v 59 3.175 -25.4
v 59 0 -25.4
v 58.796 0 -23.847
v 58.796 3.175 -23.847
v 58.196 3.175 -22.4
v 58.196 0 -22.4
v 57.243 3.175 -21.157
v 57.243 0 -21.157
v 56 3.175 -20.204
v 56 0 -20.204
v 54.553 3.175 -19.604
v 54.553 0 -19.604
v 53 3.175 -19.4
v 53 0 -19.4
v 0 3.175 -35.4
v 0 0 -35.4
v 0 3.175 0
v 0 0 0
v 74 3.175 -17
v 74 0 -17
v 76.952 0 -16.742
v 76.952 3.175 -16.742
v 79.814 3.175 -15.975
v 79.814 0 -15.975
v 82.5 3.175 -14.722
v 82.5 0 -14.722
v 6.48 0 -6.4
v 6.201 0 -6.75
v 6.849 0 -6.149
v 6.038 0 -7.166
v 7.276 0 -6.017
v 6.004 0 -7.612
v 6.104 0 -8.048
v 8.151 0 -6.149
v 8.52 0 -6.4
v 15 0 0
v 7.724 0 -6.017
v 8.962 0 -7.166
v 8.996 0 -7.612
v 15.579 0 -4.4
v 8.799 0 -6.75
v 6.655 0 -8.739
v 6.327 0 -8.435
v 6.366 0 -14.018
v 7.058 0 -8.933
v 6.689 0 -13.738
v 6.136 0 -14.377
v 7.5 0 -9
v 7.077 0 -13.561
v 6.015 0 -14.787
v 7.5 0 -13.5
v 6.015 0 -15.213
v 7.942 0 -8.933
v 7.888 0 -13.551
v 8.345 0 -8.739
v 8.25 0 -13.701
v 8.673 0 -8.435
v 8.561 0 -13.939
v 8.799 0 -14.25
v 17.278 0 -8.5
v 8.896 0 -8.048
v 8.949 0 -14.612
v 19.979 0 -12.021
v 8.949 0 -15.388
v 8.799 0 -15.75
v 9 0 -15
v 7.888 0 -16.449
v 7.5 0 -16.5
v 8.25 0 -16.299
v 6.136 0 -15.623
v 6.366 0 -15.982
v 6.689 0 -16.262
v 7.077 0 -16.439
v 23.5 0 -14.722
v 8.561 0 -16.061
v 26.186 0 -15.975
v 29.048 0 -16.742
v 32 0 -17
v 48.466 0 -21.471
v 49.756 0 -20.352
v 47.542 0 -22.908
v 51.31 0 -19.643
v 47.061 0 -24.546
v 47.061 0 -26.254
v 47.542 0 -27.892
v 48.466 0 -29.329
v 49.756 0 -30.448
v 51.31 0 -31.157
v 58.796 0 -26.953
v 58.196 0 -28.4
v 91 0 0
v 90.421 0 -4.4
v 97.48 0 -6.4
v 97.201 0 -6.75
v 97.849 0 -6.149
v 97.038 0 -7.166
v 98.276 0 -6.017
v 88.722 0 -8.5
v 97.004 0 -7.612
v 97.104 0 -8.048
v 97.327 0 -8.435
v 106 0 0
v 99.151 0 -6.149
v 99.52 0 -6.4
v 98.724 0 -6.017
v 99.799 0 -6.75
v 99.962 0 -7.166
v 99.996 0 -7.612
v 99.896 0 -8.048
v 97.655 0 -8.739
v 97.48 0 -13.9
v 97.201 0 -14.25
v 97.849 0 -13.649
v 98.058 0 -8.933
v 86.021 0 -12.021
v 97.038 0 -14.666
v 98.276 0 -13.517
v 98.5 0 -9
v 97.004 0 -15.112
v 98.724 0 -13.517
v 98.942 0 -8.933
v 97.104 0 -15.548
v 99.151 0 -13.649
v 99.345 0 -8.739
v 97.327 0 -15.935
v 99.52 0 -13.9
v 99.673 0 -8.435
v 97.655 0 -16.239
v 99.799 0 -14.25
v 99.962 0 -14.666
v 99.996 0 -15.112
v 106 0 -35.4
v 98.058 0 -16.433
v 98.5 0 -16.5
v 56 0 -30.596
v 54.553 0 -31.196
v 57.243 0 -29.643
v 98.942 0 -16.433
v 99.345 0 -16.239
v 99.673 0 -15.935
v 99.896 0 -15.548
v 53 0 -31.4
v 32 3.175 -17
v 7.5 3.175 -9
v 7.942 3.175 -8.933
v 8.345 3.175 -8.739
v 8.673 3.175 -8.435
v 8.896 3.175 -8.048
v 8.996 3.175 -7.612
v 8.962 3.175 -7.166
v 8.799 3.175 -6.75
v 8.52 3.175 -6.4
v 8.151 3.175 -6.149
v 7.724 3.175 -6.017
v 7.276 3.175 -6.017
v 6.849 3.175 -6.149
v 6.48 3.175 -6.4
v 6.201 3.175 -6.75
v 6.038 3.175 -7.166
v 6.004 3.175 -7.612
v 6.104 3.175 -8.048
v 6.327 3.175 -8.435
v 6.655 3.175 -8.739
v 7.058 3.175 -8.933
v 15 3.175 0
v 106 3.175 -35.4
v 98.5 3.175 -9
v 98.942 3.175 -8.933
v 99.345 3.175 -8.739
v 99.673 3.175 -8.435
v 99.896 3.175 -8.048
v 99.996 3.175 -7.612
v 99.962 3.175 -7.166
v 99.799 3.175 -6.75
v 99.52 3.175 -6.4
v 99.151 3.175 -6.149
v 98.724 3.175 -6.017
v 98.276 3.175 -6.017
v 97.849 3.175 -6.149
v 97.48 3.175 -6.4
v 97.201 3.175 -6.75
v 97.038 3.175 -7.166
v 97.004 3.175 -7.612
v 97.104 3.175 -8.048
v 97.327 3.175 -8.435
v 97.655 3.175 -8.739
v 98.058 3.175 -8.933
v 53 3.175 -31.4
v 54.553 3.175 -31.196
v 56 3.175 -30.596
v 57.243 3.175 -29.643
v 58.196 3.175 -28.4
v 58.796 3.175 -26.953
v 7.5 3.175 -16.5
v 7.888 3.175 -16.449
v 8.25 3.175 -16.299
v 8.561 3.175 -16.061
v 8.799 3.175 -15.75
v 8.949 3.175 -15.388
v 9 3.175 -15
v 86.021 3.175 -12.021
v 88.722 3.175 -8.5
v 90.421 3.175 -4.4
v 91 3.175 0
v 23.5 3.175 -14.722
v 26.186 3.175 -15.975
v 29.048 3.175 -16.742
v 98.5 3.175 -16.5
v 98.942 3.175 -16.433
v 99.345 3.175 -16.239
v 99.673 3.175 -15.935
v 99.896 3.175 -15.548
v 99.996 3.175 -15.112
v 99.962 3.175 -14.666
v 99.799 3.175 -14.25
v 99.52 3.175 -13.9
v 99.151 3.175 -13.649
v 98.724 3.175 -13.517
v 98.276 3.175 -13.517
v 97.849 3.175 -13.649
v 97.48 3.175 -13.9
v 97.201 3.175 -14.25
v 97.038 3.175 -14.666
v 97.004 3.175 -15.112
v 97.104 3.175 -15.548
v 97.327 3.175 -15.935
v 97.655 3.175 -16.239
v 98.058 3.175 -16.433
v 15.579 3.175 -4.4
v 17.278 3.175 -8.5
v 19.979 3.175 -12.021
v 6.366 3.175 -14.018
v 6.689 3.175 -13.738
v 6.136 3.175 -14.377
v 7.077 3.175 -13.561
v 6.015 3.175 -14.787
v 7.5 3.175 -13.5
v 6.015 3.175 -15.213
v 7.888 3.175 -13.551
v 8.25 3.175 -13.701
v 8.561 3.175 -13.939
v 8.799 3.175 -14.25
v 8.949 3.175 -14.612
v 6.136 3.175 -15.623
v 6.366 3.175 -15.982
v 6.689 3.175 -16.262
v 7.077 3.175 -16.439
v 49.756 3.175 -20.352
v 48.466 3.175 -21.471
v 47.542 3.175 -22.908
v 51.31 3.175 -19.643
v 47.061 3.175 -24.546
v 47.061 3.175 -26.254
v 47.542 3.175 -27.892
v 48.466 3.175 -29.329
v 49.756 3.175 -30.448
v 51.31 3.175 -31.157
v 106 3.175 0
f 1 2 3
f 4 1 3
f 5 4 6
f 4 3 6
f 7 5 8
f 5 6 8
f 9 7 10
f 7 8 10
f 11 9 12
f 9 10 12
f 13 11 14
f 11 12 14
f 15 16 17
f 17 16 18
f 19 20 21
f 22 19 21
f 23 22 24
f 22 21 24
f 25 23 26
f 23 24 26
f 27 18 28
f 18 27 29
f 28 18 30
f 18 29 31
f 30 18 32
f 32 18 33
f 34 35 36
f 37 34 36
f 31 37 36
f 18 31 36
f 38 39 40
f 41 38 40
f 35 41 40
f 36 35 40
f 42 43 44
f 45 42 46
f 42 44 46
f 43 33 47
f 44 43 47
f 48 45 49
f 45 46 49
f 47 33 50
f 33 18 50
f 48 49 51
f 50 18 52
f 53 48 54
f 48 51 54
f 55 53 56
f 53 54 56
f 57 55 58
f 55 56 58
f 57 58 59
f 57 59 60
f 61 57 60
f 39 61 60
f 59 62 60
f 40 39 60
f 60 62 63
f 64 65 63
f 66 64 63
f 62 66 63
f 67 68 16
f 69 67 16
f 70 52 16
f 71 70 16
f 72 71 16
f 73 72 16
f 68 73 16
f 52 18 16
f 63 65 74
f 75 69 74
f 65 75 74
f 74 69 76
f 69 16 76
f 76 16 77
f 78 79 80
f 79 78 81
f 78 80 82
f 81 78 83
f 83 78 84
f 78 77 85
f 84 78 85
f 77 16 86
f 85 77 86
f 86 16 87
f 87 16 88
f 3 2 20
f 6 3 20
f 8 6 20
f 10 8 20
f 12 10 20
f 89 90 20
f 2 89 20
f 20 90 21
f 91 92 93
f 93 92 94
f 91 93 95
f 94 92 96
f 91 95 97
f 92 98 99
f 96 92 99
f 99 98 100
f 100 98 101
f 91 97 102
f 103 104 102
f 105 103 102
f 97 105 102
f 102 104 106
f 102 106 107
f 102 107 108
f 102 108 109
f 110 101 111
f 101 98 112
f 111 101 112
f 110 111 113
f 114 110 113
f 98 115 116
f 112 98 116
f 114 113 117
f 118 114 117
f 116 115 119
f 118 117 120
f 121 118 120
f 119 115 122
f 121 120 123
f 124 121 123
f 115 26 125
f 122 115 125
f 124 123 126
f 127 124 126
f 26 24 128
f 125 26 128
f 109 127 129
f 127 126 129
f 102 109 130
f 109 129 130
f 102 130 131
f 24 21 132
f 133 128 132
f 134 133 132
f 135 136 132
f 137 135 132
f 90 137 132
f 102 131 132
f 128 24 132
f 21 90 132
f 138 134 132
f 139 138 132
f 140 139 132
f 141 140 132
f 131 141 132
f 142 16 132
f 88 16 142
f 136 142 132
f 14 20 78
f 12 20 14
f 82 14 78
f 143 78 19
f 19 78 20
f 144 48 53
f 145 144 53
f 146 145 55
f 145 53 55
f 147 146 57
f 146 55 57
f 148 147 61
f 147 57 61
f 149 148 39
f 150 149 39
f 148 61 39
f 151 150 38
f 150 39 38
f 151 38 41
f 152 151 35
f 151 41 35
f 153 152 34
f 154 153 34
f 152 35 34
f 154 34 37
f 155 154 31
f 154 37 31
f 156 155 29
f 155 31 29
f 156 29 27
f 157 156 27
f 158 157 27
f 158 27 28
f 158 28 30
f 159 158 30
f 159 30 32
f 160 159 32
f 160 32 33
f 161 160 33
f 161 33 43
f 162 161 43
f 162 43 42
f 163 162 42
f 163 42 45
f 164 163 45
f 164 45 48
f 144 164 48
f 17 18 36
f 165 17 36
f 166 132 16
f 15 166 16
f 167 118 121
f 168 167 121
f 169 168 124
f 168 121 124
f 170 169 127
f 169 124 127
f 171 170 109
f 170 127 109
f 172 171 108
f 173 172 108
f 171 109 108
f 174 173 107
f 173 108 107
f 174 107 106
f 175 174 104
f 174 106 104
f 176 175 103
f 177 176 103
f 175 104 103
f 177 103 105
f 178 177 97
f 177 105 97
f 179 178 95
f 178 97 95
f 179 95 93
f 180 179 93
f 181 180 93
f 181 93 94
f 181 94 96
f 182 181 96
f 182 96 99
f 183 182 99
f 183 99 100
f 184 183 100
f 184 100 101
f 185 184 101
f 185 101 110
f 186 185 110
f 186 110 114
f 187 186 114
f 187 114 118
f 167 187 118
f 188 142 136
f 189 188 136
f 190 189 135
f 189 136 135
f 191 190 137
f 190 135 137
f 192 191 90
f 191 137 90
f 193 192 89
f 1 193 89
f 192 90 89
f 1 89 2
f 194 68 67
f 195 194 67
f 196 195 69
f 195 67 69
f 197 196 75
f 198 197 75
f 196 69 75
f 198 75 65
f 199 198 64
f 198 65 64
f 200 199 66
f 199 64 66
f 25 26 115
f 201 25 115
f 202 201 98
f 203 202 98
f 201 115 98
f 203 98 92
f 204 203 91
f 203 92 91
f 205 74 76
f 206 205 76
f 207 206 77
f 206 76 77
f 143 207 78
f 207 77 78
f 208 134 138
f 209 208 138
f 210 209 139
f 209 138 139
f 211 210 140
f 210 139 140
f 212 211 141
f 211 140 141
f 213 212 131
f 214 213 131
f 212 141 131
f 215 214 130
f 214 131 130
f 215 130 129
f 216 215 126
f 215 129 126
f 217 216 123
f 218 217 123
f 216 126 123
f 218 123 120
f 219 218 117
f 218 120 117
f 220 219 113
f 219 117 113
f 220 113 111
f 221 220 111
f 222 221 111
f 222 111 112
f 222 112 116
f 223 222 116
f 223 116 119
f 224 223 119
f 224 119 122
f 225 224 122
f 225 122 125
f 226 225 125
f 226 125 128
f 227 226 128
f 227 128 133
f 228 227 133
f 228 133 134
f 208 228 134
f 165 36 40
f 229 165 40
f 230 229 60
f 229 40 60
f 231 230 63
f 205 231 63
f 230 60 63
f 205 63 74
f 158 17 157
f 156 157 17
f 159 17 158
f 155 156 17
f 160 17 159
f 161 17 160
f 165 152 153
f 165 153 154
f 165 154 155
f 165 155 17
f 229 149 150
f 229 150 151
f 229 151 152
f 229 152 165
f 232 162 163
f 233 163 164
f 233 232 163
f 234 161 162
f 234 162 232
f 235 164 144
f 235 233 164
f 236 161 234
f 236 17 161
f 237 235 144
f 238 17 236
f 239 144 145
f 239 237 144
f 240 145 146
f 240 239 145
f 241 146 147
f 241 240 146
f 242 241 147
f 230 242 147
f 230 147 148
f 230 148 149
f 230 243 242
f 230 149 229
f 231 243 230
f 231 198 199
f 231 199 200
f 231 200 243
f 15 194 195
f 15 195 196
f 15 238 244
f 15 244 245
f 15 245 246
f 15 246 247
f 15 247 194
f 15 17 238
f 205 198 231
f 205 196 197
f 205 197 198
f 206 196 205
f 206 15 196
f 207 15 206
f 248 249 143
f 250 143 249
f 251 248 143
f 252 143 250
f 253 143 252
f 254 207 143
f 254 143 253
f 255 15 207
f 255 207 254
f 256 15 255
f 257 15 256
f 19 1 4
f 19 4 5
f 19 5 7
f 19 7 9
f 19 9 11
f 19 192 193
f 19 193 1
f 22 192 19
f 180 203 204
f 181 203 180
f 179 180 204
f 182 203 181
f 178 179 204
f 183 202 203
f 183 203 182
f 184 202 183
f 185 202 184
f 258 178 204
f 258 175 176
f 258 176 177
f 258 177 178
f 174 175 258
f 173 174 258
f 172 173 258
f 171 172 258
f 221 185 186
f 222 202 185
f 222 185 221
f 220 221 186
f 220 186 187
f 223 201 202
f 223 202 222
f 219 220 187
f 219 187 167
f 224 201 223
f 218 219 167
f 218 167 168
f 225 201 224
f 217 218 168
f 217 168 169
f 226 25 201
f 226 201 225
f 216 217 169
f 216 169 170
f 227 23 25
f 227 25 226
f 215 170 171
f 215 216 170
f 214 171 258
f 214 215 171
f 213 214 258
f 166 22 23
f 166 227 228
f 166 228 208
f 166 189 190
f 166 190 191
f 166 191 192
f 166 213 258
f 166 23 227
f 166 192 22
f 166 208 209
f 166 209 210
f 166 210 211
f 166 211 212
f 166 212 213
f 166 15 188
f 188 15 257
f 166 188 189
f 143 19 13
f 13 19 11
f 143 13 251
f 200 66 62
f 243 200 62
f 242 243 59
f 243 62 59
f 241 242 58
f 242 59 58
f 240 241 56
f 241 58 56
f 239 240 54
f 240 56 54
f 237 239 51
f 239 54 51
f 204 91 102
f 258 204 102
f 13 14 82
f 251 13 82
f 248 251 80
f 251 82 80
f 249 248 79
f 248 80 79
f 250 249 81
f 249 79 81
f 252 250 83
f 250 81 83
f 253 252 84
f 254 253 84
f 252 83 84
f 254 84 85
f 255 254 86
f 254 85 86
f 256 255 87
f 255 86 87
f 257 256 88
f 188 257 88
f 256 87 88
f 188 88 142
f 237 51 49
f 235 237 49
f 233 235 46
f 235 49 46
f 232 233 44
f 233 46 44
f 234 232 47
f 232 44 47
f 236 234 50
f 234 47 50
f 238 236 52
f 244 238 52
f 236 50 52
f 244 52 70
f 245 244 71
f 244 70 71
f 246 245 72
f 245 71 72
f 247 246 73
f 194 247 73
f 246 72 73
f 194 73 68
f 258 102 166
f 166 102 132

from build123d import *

# Parameters (mm, degrees)
BOSS_EXTRUDE1_DEPTH = 3.175
SKETCH3_R           = 1.5
CUT_EXTRUDE2_DEPTH  = 112.800002795


with BuildPart() as part:
    # Sketch1 → Boss-Extrude1 (new body)
    with BuildSketch(Plane(origin=(0, 0, 0), x_dir=(1, 0, 0), z_dir=(0, 1, 0))):
        with BuildLine():
            ThreePointArc((59, 25.4), (57.242640687, 21.157359313), (53, 19.4))
            Line((53, 19.4), (53, 17.4))
            Line((53, 17.4), (53, 17))
            Line((53, 17), (74, 17))
            Line((74, 17), (91, 17))
            ThreePointArc((91, 17), (99.746427842, 14.577379737), (106, 8))
            Line((106, 8), (106, 35.4))
            Line((106, 35.4), (53, 35.4))
            Line((53, 35.4), (53, 31.4))
            ThreePointArc((53, 31.4), (57.242640687, 29.642640687), (59, 25.4))
        make_face()
        with BuildLine():
            ThreePointArc((106, 8), (99.746427842, 14.577379737), (91, 17))
            Line((91, 17), (91, 0))
            Line((91, 0), (106, 0))
            Line((106, 0), (106, 8))
        make_face()
        with BuildLine():
            Line((91, 0), (91, 17))
            ThreePointArc((91, 17), (86.600076233, 16.420739047), (82.5, 14.722431864))
            ThreePointArc((82.5, 14.722431864), (88.722431864, 8.5), (91, 0))
        make_face()
        with BuildLine():
            Line((91, 17), (74, 17))
            ThreePointArc((74, 17), (78.399923767, 16.420739047), (82.5, 14.722431864))
            ThreePointArc((82.5, 14.722431864), (86.600076233, 16.420739047), (91, 17))
        make_face()
        with BuildLine():
            Line((53, 17.4), (53, 19.4))
            ThreePointArc((53, 19.4), (47, 25.4), (53, 31.4))
            Line((53, 31.4), (53, 35.4))
            Line((53, 35.4), (0, 35.4))
            Line((0, 35.4), (0, 8))
            ThreePointArc((0, 8), (6.253572158, 14.577379737), (15, 17))
            Line((15, 17), (32, 17))
            Line((32, 17), (53, 17))
            Line((53, 17), (53, 17.4))
        make_face()
        with BuildLine():
            Line((15, 0), (15, 17))
            ThreePointArc((15, 17), (6.253572158, 14.577379737), (0, 8))
            Line((0, 8), (0, 0))
            Line((0, 0), (15, 0))
        make_face()
        with BuildLine():
            ThreePointArc((23.5, 14.722431864), (19.399923767, 16.420739047), (15, 17))
            Line((15, 17), (15, 0))
            ThreePointArc((15, 0), (17.277568136, 8.5), (23.5, 14.722431864))
        make_face()
        with BuildLine():
            ThreePointArc((23.5, 14.722431864), (27.600076233, 16.420739047), (32, 17))
            Line((32, 17), (15, 17))
            ThreePointArc((15, 17), (19.399923767, 16.420739047), (23.5, 14.722431864))
        make_face()
    extrude(amount=BOSS_EXTRUDE1_DEPTH)

    # Sketch3 → Cut-Extrude2 (cut, through all)
    with BuildSketch(Plane.XZ):
        with BuildLine():
            ThreePointArc((9, -15), (8.560660172, -13.939339828), (7.5, -13.5))
            Line((7.5, -13.5), (7.5, -16.5))
            ThreePointArc((7.5, -16.5), (8.560660172, -16.060660172), (9, -15))
        make_face()
        with BuildLine():
            Line((7.5, -16.5), (7.5, -13.5))
            ThreePointArc((7.5, -13.5), (6, -15), (7.5, -16.5))
        make_face()
        with Locations(Location((98.5, -15, 0), (0, 0, 270))):
            Circle(SKETCH3_R)
        with Locations(Location((98.5, -7.5, 0), (0, 0, 270))):
            Circle(SKETCH3_R)
        with Locations(Location((7.5, -7.5, 0), (0, 0, 270))):
            Circle(SKETCH3_R)
    extrude(amount=-CUT_EXTRUDE2_DEPTH, mode=Mode.SUBTRACT)


solid = part.part
